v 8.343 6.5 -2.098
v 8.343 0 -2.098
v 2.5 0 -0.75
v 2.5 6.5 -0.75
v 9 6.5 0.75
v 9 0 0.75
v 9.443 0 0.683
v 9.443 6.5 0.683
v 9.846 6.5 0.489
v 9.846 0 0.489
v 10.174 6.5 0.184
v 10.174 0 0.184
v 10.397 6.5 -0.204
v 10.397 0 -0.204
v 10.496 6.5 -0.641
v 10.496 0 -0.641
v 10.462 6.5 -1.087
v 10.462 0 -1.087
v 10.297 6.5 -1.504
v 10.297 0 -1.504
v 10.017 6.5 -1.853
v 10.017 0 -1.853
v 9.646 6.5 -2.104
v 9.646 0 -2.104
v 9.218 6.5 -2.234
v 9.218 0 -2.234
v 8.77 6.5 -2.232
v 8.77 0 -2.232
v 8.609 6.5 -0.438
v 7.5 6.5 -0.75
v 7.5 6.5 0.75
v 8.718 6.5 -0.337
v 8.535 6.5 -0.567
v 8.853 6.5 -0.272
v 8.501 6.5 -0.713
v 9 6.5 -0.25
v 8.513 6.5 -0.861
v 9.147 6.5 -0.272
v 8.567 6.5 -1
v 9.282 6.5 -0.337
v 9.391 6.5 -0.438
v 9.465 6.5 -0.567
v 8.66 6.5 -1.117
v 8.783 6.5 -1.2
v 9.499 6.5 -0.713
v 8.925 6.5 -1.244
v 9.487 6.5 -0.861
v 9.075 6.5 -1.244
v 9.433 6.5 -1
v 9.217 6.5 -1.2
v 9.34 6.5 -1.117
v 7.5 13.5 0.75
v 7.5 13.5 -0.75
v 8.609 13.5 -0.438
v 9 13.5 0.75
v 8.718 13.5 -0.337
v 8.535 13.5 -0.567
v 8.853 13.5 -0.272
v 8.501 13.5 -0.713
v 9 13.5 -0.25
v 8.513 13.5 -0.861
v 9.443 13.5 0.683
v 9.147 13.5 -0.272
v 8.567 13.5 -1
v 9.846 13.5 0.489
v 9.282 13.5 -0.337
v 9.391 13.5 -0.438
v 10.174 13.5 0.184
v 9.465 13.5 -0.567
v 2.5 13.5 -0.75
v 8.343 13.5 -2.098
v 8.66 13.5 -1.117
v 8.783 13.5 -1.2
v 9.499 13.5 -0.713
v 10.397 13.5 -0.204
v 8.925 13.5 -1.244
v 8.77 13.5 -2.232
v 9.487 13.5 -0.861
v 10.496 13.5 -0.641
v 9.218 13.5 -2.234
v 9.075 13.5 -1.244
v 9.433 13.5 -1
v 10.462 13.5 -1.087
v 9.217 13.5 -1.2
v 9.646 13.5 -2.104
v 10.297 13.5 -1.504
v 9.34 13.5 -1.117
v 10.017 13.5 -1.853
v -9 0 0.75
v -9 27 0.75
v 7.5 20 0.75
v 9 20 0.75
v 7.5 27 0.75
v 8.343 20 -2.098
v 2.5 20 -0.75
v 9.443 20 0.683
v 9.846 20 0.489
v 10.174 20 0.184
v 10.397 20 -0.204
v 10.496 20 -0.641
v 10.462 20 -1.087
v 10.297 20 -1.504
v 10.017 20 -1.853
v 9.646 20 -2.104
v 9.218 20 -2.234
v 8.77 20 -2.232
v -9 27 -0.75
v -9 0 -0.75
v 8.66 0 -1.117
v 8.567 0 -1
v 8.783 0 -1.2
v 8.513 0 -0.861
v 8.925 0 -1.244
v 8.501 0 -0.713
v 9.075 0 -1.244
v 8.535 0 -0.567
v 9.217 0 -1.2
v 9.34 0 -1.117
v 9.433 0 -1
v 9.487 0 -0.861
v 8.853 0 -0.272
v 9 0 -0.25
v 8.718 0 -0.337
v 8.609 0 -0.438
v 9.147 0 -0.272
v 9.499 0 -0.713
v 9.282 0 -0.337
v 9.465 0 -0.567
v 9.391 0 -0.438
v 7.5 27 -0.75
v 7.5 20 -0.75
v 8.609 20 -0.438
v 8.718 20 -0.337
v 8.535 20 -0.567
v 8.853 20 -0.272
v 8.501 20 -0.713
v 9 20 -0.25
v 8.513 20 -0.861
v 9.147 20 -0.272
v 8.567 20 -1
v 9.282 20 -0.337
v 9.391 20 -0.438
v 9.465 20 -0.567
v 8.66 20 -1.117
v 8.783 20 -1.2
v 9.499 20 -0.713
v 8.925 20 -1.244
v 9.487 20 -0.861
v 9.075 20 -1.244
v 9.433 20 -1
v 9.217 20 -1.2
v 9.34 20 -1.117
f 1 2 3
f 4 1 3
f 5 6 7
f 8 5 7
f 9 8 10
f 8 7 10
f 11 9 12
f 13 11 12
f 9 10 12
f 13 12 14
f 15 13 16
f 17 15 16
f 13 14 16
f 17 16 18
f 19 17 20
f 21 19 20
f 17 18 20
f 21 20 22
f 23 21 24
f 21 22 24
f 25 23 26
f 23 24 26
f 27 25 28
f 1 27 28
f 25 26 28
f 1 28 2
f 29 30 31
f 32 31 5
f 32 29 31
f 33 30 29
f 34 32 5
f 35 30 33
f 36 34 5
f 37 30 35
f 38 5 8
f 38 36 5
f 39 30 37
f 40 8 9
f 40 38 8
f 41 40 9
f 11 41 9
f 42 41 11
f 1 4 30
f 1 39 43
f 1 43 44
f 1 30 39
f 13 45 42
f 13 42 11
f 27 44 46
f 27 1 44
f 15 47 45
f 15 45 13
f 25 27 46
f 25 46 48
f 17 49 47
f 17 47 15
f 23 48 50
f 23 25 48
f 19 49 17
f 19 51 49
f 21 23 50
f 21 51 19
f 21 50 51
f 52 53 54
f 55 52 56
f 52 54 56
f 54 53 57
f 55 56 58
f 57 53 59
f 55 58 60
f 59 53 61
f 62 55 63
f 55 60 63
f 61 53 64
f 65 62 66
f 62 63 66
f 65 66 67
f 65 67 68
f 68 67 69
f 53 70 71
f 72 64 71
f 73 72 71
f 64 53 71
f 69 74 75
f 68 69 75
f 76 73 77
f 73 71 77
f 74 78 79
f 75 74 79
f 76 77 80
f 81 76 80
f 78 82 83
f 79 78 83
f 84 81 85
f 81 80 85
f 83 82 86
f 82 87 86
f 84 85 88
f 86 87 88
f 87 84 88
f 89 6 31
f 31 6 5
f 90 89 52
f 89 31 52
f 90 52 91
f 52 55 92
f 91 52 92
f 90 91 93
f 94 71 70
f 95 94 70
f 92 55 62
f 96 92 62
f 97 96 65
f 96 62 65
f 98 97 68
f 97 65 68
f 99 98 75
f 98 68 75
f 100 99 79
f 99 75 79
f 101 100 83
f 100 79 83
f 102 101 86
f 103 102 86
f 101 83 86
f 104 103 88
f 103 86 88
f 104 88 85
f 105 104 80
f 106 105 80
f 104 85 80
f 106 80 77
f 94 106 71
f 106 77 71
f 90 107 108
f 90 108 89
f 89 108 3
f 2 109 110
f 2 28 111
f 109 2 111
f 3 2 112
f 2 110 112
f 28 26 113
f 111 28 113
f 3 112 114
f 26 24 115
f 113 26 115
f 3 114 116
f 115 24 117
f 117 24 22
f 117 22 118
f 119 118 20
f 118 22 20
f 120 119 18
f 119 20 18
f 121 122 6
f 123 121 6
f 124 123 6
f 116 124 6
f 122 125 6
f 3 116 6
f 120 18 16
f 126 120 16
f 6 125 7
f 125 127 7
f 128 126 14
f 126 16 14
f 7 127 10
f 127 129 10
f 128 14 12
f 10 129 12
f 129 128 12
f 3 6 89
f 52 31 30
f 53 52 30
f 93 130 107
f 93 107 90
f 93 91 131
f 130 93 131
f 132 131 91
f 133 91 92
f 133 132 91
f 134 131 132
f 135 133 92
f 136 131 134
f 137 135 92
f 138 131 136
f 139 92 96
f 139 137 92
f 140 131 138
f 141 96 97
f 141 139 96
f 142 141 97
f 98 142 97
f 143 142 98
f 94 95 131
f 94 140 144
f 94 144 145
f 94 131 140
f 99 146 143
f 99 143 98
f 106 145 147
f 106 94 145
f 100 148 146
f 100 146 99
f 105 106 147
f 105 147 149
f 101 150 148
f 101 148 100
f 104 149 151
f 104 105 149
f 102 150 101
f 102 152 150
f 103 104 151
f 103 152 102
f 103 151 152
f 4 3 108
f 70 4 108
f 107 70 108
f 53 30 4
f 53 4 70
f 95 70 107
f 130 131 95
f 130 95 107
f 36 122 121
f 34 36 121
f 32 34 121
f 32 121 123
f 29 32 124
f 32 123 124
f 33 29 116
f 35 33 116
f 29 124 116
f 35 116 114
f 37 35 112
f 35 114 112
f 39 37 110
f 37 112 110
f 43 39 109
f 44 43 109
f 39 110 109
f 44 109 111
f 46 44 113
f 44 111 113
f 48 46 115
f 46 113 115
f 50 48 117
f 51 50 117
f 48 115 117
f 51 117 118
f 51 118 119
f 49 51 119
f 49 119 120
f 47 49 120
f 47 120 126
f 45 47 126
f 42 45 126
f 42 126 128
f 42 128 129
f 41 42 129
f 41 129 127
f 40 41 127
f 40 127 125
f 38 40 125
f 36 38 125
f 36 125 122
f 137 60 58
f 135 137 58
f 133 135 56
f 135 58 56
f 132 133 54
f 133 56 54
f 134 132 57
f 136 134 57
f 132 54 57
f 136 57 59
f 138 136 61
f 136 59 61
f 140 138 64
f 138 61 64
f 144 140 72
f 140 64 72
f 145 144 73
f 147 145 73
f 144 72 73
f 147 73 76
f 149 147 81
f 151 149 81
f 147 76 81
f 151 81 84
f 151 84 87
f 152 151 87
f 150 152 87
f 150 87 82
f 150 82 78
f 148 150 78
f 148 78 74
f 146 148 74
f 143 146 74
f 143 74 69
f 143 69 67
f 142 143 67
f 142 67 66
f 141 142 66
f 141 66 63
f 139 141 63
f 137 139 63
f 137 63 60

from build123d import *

# Parameters (mm, degrees)
BOSS_EXTRUDE1_DEPTH = 6.5
SKETCH2_W           = 15
SKETCH2_H           = 1.5
BOSS_EXTRUDE2_DEPTH = 7
BOSS_EXTRUDE3_DEPTH = 6.5
SKETCH4_W           = 15
SKETCH4_H           = 1.5
BOSS_EXTRUDE4_DEPTH = 7
SKETCH5_R           = 0.5
CUT_EXTRUDE1_DEPTH  = 27
SKETCH6_W           = 1.5
SKETCH6_H           = 27
BOSS_EXTRUDE5_DEPTH = 1.5


with BuildPart() as part:
    # Sketch1 → Boss-Extrude1 (new body)
    with BuildSketch(Plane(origin=(0, 0, 0), x_dir=(1, 0, 0), z_dir=(0, 1, 0))):
        with BuildLine():
            Line((-7.5, -0.75), (9, -0.75))
            ThreePointArc((9, -0.75), (10.461586794, 1.08728926), (8.342696629, 2.098314607))
            Line((8.342696629, 2.098314607), (2.5, 0.75))
            Line((2.5, 0.75), (-7.5, 0.75))
            Line((-7.5, 0.75), (-7.5, -0.75))
        make_face()
    extrude(amount=BOSS_EXTRUDE1_DEPTH)

    # Sketch2 → Boss-Extrude2 (add)
    with BuildSketch(Plane(origin=(0, 6.5, 0), x_dir=(1, 0, 0), z_dir=(0, 1, 0))):
        Rectangle(SKETCH2_W, SKETCH2_H)
    extrude(amount=BOSS_EXTRUDE2_DEPTH)

    # Sketch3 → Boss-Extrude3 (add)
    with BuildSketch(Plane(origin=(0, 13.5, 0), x_dir=(1, 0, 0), z_dir=(0, 1, 0))):
        with BuildLine():
            Line((-7.5, -0.75), (9, -0.75))
            ThreePointArc((9, -0.75), (10.461586794, 1.08728926), (8.342696629, 2.098314607))
            Line((8.342696629, 2.098314607), (2.5, 0.75))
            Line((2.5, 0.75), (-7.5, 0.75))
            Line((-7.5, 0.75), (-7.5, -0.75))
        make_face()
    extrude(amount=BOSS_EXTRUDE3_DEPTH)

    # Sketch4 → Boss-Extrude4 (add)
    with BuildSketch(Plane(origin=(0, 20, 0), x_dir=(1, 0, 0), z_dir=(0, 1, 0))):
        Rectangle(SKETCH4_W, SKETCH4_H)
    extrude(amount=BOSS_EXTRUDE4_DEPTH)

    # Sketch5 → Cut-Extrude1 (cut)
    with BuildSketch(Plane.XZ):
        with Locations(Location((9, -0.75, 0), (0, 0, 90))):
            Circle(SKETCH5_R)
    extrude(amount=-CUT_EXTRUDE1_DEPTH, mode=Mode.SUBTRACT)

    # Sketch6 → Boss-Extrude5 (add)
    with BuildSketch(Plane.ZY.offset(7.5)):
        with Locations((0, 13.5)):
            Rectangle(SKETCH6_W, SKETCH6_H)
    extrude(amount=BOSS_EXTRUDE5_DEPTH)


solid = part.part
